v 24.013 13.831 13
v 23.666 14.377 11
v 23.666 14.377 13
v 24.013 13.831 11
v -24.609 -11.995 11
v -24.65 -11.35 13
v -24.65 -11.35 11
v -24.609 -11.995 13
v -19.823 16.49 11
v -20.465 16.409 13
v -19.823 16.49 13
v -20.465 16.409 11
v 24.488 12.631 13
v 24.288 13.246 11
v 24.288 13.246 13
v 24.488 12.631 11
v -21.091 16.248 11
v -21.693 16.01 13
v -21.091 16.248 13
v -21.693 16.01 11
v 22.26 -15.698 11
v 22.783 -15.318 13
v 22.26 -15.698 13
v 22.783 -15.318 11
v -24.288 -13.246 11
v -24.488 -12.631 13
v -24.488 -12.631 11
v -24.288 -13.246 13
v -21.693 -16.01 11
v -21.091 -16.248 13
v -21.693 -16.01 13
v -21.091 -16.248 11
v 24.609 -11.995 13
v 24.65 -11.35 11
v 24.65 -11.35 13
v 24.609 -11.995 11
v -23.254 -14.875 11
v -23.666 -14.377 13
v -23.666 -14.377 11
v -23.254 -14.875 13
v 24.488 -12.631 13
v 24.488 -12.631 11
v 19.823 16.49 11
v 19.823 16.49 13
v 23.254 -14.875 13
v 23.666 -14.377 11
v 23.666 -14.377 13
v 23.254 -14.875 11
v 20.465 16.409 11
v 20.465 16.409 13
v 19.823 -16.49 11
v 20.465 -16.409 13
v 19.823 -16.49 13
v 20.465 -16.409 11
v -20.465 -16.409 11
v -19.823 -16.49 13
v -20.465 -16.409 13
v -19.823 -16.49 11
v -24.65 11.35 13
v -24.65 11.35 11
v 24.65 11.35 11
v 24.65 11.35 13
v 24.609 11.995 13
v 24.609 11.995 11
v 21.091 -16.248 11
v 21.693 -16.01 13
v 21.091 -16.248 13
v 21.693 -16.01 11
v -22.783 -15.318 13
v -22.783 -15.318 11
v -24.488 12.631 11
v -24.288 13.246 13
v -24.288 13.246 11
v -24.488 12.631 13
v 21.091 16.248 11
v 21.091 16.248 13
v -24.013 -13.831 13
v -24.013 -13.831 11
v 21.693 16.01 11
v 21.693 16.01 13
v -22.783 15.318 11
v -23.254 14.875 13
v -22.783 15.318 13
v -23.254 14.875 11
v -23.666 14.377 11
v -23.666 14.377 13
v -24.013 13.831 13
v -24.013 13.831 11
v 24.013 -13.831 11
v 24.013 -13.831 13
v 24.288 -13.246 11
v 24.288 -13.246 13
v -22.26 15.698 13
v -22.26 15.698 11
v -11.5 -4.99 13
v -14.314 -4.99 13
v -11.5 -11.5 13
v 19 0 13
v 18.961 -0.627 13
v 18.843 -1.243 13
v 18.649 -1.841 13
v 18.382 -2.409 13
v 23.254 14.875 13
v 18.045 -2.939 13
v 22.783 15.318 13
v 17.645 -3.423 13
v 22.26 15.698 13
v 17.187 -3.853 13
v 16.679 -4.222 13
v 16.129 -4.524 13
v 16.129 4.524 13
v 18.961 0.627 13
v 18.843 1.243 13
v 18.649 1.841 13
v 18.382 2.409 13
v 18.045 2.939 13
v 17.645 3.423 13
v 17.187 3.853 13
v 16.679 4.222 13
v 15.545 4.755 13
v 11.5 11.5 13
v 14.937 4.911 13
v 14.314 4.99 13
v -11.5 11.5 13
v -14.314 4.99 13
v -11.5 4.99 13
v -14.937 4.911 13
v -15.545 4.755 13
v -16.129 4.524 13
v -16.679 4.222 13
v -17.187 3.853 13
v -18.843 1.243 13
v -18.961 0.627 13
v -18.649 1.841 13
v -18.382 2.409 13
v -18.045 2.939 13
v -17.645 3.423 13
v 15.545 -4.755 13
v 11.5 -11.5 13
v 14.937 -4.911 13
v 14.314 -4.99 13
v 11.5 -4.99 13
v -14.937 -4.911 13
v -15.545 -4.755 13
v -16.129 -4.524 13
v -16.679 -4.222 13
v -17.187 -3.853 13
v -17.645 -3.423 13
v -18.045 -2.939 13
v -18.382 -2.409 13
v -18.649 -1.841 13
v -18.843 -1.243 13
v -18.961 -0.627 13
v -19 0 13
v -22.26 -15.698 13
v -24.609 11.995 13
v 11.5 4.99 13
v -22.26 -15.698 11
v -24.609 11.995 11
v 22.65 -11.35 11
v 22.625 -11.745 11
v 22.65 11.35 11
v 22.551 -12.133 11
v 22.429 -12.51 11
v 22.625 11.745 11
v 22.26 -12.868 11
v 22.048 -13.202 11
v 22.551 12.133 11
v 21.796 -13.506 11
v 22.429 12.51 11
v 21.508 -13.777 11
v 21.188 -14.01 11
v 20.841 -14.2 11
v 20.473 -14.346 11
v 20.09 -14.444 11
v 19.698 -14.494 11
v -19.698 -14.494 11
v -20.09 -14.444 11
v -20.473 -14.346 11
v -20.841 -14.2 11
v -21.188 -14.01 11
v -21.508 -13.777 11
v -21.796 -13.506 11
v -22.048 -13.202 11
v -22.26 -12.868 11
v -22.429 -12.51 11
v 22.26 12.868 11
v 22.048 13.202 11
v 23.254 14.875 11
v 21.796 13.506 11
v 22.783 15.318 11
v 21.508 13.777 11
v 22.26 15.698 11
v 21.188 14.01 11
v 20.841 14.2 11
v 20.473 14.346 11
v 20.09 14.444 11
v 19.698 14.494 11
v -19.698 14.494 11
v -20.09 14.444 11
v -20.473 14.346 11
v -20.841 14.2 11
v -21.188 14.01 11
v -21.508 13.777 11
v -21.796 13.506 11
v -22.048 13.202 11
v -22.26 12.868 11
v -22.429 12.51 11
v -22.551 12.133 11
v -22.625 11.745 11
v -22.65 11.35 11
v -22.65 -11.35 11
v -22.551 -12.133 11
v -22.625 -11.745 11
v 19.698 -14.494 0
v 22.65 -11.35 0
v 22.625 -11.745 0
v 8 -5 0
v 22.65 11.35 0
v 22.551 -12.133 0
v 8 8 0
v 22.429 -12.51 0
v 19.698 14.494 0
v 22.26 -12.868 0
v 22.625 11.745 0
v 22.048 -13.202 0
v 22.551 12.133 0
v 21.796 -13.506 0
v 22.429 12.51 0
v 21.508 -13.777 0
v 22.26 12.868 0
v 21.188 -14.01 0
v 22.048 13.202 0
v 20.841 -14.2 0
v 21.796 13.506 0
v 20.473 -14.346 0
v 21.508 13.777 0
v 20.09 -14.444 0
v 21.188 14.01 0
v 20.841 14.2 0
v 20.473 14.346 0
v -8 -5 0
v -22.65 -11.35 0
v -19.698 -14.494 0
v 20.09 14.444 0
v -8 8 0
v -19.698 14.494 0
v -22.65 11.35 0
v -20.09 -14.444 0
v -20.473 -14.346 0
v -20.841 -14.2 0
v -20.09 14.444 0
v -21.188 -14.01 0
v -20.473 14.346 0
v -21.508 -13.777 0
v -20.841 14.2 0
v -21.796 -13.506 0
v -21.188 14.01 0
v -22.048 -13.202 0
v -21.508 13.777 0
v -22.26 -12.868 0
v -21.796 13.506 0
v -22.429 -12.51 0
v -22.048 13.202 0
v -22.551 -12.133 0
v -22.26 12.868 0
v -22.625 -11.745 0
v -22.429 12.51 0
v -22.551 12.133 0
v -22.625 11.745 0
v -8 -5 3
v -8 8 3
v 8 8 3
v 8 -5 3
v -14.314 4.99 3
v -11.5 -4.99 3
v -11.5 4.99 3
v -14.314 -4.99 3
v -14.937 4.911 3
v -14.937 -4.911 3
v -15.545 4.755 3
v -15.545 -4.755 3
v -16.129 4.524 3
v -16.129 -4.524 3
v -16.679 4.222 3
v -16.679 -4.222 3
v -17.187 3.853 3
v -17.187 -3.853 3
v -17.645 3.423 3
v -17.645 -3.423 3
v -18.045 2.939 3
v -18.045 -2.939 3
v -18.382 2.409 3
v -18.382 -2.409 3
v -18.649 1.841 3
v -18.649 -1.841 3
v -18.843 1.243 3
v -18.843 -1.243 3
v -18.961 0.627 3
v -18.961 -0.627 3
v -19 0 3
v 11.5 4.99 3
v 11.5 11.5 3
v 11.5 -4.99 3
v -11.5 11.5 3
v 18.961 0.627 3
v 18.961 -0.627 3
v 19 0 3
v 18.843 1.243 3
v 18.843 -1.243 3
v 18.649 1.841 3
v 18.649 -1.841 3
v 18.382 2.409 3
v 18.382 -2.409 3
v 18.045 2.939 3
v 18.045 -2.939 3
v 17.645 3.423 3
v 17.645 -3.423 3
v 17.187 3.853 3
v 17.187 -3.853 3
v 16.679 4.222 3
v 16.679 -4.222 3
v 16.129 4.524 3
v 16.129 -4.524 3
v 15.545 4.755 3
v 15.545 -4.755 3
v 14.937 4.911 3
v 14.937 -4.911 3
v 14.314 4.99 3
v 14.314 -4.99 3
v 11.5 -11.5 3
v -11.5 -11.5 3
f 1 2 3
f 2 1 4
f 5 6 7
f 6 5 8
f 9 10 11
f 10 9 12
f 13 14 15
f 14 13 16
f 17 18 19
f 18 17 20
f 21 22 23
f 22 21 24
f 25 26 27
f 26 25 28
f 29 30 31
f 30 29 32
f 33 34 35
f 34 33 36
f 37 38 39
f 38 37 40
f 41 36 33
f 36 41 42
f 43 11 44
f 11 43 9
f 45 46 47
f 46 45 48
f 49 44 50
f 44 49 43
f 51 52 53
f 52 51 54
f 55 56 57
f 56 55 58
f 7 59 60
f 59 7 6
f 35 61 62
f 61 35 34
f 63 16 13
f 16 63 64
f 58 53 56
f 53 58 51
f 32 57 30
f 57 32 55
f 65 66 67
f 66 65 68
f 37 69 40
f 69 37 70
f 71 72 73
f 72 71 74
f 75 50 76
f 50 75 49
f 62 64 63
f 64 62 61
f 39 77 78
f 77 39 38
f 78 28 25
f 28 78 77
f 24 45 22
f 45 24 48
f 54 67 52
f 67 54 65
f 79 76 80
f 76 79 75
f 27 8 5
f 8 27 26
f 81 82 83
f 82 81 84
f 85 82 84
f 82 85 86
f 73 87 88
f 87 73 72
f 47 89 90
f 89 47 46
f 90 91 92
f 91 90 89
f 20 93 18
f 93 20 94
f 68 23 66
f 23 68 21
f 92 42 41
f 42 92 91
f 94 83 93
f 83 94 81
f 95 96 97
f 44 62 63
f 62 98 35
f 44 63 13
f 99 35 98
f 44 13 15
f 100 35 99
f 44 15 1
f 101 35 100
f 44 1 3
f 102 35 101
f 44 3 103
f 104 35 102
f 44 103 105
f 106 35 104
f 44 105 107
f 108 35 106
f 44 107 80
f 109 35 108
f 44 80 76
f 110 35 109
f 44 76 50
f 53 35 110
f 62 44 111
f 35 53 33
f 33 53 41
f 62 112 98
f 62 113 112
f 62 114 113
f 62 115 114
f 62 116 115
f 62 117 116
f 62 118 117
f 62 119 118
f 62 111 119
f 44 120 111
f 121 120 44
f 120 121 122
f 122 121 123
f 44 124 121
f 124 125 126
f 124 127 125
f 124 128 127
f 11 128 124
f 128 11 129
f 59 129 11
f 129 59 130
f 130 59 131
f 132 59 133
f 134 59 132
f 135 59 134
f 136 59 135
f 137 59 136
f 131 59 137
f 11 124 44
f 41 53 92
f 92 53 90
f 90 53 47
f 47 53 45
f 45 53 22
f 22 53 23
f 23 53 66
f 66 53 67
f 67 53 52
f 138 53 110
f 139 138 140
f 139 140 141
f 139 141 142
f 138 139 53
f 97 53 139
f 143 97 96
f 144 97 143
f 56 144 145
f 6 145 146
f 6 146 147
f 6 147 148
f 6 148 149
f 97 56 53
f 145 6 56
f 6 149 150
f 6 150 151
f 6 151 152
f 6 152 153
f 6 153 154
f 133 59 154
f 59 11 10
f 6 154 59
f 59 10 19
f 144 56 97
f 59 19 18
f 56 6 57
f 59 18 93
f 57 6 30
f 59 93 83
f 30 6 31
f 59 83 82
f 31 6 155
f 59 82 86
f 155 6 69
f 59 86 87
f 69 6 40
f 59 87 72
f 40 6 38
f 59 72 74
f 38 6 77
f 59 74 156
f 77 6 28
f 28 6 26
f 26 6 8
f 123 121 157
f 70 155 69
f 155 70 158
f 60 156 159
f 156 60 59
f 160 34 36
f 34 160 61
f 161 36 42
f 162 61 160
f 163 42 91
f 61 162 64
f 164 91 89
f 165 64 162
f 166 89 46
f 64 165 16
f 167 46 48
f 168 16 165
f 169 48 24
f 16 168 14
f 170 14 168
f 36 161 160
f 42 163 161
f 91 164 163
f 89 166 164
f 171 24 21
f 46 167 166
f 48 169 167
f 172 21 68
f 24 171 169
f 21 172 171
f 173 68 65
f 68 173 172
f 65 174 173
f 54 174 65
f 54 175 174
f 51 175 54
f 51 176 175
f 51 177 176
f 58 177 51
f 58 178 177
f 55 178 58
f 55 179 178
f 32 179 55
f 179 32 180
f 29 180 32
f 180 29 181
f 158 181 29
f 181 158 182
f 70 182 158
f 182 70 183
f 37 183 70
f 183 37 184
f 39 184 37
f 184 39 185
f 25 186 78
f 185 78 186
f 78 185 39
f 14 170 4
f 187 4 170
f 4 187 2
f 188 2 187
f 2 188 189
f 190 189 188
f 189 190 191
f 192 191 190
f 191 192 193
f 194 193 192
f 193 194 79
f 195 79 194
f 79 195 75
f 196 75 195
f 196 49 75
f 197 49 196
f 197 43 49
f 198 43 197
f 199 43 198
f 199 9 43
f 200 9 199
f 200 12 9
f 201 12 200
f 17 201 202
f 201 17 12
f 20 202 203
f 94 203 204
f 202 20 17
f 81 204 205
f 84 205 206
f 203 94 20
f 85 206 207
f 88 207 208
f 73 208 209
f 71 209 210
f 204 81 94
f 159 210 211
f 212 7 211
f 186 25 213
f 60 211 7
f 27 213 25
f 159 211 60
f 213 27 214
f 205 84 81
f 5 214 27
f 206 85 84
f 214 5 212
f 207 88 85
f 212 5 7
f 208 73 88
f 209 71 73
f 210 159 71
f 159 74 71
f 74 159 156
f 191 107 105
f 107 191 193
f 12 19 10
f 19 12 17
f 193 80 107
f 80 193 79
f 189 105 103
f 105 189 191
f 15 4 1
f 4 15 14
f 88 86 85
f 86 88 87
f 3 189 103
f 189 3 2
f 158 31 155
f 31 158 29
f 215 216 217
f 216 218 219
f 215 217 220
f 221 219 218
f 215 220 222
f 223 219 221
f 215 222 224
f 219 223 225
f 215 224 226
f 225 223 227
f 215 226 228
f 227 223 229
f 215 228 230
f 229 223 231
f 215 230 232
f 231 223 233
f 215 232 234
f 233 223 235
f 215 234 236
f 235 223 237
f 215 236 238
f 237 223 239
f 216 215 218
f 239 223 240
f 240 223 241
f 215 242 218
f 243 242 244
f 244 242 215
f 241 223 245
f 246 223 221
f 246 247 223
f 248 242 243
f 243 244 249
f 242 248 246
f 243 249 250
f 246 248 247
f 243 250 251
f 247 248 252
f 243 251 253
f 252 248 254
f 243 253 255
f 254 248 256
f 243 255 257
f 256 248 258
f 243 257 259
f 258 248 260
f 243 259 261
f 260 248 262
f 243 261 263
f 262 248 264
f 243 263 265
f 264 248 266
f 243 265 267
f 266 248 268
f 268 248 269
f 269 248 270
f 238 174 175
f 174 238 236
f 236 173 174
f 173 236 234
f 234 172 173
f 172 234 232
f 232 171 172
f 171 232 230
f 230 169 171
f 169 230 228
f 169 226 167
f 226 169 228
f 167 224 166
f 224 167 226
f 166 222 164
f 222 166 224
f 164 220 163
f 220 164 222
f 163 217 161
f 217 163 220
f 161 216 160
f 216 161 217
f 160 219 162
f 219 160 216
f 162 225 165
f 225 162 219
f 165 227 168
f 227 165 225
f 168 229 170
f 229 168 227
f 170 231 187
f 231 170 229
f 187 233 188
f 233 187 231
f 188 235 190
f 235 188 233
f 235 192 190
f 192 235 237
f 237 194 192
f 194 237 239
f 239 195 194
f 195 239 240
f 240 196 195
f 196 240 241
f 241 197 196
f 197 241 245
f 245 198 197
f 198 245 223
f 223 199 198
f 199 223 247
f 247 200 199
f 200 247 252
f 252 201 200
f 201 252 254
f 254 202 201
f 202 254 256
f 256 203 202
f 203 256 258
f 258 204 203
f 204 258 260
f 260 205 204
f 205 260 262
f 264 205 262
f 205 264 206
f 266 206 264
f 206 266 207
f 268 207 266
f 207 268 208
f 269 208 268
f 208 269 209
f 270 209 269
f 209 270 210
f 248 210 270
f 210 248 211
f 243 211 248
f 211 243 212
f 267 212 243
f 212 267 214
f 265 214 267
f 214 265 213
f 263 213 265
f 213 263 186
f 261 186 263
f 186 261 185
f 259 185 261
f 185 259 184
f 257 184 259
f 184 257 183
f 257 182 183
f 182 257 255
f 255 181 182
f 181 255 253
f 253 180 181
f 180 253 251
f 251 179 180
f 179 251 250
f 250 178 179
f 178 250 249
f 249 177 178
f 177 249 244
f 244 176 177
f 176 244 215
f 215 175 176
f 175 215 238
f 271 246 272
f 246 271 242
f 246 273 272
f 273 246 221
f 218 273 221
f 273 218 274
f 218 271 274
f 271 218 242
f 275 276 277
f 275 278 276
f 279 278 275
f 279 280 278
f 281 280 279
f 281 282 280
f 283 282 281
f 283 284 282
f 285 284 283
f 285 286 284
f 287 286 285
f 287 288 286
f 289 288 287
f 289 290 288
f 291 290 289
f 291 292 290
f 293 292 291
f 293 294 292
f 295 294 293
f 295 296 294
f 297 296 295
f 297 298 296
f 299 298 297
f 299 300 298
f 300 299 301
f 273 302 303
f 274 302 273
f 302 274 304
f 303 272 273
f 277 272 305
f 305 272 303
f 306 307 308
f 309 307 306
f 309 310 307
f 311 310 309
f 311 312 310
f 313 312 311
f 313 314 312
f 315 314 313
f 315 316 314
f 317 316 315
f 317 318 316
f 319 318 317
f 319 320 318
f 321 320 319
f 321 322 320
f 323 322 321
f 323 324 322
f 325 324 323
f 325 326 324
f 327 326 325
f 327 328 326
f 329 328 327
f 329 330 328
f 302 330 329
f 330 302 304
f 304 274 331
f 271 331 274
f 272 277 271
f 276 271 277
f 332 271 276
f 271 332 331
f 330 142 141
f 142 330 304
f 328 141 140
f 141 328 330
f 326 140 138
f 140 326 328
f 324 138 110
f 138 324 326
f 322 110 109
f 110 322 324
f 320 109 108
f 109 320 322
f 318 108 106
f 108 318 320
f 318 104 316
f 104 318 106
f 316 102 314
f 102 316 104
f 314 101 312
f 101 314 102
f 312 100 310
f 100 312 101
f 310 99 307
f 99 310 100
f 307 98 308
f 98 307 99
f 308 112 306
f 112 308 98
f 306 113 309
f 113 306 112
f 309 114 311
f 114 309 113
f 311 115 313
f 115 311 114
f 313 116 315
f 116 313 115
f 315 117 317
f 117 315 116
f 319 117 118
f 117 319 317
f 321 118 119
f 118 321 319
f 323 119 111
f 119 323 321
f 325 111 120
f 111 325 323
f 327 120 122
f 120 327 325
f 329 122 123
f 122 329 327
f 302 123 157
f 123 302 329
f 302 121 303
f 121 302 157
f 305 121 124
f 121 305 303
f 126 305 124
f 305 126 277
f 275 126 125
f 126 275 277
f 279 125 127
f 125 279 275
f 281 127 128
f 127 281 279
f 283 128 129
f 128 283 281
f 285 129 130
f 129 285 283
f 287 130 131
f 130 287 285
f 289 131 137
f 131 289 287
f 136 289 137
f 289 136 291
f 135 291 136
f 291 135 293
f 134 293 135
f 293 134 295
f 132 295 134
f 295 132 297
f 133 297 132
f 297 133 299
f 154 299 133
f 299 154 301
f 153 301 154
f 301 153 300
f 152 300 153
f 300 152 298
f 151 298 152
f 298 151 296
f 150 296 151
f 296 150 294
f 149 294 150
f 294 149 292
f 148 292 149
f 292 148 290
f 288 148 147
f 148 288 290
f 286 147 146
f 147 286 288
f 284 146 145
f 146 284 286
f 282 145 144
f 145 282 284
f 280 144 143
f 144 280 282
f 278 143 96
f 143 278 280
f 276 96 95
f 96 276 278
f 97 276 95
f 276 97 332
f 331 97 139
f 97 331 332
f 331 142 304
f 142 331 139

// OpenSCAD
$fn = 50;

thickness = 3;
circle_d = 6.3;
size = [39.3+2*thickness-circle_d, 23+2*thickness-circle_d];
height=11;
hole_size = [16, 13];

difference() {
    union() {
        translate([0, 0, height])
        linear_extrude(height=2)
        body(size, circle_d+4);
         
        linear_extrude(height=height)
        difference() {
            body(size, circle_d);
            translate([0, hole_size.y/2 - 10/2])
            square(hole_size, center=true);
        }
    };
    
    translate([0, 0, thickness])
    linear_extrude(height=height+1) {
        hull() {
            translate([-28/2, 0])
            circle(d=10);
            translate([28/2, 0])
            circle(d=10);
        };
        square([23, 23], center=true);
    }
};

module body(size, circle_d) {
    minkowski() {
        circle(d=circle_d);
        square([size.x, size.y], center=true);
    }
}
